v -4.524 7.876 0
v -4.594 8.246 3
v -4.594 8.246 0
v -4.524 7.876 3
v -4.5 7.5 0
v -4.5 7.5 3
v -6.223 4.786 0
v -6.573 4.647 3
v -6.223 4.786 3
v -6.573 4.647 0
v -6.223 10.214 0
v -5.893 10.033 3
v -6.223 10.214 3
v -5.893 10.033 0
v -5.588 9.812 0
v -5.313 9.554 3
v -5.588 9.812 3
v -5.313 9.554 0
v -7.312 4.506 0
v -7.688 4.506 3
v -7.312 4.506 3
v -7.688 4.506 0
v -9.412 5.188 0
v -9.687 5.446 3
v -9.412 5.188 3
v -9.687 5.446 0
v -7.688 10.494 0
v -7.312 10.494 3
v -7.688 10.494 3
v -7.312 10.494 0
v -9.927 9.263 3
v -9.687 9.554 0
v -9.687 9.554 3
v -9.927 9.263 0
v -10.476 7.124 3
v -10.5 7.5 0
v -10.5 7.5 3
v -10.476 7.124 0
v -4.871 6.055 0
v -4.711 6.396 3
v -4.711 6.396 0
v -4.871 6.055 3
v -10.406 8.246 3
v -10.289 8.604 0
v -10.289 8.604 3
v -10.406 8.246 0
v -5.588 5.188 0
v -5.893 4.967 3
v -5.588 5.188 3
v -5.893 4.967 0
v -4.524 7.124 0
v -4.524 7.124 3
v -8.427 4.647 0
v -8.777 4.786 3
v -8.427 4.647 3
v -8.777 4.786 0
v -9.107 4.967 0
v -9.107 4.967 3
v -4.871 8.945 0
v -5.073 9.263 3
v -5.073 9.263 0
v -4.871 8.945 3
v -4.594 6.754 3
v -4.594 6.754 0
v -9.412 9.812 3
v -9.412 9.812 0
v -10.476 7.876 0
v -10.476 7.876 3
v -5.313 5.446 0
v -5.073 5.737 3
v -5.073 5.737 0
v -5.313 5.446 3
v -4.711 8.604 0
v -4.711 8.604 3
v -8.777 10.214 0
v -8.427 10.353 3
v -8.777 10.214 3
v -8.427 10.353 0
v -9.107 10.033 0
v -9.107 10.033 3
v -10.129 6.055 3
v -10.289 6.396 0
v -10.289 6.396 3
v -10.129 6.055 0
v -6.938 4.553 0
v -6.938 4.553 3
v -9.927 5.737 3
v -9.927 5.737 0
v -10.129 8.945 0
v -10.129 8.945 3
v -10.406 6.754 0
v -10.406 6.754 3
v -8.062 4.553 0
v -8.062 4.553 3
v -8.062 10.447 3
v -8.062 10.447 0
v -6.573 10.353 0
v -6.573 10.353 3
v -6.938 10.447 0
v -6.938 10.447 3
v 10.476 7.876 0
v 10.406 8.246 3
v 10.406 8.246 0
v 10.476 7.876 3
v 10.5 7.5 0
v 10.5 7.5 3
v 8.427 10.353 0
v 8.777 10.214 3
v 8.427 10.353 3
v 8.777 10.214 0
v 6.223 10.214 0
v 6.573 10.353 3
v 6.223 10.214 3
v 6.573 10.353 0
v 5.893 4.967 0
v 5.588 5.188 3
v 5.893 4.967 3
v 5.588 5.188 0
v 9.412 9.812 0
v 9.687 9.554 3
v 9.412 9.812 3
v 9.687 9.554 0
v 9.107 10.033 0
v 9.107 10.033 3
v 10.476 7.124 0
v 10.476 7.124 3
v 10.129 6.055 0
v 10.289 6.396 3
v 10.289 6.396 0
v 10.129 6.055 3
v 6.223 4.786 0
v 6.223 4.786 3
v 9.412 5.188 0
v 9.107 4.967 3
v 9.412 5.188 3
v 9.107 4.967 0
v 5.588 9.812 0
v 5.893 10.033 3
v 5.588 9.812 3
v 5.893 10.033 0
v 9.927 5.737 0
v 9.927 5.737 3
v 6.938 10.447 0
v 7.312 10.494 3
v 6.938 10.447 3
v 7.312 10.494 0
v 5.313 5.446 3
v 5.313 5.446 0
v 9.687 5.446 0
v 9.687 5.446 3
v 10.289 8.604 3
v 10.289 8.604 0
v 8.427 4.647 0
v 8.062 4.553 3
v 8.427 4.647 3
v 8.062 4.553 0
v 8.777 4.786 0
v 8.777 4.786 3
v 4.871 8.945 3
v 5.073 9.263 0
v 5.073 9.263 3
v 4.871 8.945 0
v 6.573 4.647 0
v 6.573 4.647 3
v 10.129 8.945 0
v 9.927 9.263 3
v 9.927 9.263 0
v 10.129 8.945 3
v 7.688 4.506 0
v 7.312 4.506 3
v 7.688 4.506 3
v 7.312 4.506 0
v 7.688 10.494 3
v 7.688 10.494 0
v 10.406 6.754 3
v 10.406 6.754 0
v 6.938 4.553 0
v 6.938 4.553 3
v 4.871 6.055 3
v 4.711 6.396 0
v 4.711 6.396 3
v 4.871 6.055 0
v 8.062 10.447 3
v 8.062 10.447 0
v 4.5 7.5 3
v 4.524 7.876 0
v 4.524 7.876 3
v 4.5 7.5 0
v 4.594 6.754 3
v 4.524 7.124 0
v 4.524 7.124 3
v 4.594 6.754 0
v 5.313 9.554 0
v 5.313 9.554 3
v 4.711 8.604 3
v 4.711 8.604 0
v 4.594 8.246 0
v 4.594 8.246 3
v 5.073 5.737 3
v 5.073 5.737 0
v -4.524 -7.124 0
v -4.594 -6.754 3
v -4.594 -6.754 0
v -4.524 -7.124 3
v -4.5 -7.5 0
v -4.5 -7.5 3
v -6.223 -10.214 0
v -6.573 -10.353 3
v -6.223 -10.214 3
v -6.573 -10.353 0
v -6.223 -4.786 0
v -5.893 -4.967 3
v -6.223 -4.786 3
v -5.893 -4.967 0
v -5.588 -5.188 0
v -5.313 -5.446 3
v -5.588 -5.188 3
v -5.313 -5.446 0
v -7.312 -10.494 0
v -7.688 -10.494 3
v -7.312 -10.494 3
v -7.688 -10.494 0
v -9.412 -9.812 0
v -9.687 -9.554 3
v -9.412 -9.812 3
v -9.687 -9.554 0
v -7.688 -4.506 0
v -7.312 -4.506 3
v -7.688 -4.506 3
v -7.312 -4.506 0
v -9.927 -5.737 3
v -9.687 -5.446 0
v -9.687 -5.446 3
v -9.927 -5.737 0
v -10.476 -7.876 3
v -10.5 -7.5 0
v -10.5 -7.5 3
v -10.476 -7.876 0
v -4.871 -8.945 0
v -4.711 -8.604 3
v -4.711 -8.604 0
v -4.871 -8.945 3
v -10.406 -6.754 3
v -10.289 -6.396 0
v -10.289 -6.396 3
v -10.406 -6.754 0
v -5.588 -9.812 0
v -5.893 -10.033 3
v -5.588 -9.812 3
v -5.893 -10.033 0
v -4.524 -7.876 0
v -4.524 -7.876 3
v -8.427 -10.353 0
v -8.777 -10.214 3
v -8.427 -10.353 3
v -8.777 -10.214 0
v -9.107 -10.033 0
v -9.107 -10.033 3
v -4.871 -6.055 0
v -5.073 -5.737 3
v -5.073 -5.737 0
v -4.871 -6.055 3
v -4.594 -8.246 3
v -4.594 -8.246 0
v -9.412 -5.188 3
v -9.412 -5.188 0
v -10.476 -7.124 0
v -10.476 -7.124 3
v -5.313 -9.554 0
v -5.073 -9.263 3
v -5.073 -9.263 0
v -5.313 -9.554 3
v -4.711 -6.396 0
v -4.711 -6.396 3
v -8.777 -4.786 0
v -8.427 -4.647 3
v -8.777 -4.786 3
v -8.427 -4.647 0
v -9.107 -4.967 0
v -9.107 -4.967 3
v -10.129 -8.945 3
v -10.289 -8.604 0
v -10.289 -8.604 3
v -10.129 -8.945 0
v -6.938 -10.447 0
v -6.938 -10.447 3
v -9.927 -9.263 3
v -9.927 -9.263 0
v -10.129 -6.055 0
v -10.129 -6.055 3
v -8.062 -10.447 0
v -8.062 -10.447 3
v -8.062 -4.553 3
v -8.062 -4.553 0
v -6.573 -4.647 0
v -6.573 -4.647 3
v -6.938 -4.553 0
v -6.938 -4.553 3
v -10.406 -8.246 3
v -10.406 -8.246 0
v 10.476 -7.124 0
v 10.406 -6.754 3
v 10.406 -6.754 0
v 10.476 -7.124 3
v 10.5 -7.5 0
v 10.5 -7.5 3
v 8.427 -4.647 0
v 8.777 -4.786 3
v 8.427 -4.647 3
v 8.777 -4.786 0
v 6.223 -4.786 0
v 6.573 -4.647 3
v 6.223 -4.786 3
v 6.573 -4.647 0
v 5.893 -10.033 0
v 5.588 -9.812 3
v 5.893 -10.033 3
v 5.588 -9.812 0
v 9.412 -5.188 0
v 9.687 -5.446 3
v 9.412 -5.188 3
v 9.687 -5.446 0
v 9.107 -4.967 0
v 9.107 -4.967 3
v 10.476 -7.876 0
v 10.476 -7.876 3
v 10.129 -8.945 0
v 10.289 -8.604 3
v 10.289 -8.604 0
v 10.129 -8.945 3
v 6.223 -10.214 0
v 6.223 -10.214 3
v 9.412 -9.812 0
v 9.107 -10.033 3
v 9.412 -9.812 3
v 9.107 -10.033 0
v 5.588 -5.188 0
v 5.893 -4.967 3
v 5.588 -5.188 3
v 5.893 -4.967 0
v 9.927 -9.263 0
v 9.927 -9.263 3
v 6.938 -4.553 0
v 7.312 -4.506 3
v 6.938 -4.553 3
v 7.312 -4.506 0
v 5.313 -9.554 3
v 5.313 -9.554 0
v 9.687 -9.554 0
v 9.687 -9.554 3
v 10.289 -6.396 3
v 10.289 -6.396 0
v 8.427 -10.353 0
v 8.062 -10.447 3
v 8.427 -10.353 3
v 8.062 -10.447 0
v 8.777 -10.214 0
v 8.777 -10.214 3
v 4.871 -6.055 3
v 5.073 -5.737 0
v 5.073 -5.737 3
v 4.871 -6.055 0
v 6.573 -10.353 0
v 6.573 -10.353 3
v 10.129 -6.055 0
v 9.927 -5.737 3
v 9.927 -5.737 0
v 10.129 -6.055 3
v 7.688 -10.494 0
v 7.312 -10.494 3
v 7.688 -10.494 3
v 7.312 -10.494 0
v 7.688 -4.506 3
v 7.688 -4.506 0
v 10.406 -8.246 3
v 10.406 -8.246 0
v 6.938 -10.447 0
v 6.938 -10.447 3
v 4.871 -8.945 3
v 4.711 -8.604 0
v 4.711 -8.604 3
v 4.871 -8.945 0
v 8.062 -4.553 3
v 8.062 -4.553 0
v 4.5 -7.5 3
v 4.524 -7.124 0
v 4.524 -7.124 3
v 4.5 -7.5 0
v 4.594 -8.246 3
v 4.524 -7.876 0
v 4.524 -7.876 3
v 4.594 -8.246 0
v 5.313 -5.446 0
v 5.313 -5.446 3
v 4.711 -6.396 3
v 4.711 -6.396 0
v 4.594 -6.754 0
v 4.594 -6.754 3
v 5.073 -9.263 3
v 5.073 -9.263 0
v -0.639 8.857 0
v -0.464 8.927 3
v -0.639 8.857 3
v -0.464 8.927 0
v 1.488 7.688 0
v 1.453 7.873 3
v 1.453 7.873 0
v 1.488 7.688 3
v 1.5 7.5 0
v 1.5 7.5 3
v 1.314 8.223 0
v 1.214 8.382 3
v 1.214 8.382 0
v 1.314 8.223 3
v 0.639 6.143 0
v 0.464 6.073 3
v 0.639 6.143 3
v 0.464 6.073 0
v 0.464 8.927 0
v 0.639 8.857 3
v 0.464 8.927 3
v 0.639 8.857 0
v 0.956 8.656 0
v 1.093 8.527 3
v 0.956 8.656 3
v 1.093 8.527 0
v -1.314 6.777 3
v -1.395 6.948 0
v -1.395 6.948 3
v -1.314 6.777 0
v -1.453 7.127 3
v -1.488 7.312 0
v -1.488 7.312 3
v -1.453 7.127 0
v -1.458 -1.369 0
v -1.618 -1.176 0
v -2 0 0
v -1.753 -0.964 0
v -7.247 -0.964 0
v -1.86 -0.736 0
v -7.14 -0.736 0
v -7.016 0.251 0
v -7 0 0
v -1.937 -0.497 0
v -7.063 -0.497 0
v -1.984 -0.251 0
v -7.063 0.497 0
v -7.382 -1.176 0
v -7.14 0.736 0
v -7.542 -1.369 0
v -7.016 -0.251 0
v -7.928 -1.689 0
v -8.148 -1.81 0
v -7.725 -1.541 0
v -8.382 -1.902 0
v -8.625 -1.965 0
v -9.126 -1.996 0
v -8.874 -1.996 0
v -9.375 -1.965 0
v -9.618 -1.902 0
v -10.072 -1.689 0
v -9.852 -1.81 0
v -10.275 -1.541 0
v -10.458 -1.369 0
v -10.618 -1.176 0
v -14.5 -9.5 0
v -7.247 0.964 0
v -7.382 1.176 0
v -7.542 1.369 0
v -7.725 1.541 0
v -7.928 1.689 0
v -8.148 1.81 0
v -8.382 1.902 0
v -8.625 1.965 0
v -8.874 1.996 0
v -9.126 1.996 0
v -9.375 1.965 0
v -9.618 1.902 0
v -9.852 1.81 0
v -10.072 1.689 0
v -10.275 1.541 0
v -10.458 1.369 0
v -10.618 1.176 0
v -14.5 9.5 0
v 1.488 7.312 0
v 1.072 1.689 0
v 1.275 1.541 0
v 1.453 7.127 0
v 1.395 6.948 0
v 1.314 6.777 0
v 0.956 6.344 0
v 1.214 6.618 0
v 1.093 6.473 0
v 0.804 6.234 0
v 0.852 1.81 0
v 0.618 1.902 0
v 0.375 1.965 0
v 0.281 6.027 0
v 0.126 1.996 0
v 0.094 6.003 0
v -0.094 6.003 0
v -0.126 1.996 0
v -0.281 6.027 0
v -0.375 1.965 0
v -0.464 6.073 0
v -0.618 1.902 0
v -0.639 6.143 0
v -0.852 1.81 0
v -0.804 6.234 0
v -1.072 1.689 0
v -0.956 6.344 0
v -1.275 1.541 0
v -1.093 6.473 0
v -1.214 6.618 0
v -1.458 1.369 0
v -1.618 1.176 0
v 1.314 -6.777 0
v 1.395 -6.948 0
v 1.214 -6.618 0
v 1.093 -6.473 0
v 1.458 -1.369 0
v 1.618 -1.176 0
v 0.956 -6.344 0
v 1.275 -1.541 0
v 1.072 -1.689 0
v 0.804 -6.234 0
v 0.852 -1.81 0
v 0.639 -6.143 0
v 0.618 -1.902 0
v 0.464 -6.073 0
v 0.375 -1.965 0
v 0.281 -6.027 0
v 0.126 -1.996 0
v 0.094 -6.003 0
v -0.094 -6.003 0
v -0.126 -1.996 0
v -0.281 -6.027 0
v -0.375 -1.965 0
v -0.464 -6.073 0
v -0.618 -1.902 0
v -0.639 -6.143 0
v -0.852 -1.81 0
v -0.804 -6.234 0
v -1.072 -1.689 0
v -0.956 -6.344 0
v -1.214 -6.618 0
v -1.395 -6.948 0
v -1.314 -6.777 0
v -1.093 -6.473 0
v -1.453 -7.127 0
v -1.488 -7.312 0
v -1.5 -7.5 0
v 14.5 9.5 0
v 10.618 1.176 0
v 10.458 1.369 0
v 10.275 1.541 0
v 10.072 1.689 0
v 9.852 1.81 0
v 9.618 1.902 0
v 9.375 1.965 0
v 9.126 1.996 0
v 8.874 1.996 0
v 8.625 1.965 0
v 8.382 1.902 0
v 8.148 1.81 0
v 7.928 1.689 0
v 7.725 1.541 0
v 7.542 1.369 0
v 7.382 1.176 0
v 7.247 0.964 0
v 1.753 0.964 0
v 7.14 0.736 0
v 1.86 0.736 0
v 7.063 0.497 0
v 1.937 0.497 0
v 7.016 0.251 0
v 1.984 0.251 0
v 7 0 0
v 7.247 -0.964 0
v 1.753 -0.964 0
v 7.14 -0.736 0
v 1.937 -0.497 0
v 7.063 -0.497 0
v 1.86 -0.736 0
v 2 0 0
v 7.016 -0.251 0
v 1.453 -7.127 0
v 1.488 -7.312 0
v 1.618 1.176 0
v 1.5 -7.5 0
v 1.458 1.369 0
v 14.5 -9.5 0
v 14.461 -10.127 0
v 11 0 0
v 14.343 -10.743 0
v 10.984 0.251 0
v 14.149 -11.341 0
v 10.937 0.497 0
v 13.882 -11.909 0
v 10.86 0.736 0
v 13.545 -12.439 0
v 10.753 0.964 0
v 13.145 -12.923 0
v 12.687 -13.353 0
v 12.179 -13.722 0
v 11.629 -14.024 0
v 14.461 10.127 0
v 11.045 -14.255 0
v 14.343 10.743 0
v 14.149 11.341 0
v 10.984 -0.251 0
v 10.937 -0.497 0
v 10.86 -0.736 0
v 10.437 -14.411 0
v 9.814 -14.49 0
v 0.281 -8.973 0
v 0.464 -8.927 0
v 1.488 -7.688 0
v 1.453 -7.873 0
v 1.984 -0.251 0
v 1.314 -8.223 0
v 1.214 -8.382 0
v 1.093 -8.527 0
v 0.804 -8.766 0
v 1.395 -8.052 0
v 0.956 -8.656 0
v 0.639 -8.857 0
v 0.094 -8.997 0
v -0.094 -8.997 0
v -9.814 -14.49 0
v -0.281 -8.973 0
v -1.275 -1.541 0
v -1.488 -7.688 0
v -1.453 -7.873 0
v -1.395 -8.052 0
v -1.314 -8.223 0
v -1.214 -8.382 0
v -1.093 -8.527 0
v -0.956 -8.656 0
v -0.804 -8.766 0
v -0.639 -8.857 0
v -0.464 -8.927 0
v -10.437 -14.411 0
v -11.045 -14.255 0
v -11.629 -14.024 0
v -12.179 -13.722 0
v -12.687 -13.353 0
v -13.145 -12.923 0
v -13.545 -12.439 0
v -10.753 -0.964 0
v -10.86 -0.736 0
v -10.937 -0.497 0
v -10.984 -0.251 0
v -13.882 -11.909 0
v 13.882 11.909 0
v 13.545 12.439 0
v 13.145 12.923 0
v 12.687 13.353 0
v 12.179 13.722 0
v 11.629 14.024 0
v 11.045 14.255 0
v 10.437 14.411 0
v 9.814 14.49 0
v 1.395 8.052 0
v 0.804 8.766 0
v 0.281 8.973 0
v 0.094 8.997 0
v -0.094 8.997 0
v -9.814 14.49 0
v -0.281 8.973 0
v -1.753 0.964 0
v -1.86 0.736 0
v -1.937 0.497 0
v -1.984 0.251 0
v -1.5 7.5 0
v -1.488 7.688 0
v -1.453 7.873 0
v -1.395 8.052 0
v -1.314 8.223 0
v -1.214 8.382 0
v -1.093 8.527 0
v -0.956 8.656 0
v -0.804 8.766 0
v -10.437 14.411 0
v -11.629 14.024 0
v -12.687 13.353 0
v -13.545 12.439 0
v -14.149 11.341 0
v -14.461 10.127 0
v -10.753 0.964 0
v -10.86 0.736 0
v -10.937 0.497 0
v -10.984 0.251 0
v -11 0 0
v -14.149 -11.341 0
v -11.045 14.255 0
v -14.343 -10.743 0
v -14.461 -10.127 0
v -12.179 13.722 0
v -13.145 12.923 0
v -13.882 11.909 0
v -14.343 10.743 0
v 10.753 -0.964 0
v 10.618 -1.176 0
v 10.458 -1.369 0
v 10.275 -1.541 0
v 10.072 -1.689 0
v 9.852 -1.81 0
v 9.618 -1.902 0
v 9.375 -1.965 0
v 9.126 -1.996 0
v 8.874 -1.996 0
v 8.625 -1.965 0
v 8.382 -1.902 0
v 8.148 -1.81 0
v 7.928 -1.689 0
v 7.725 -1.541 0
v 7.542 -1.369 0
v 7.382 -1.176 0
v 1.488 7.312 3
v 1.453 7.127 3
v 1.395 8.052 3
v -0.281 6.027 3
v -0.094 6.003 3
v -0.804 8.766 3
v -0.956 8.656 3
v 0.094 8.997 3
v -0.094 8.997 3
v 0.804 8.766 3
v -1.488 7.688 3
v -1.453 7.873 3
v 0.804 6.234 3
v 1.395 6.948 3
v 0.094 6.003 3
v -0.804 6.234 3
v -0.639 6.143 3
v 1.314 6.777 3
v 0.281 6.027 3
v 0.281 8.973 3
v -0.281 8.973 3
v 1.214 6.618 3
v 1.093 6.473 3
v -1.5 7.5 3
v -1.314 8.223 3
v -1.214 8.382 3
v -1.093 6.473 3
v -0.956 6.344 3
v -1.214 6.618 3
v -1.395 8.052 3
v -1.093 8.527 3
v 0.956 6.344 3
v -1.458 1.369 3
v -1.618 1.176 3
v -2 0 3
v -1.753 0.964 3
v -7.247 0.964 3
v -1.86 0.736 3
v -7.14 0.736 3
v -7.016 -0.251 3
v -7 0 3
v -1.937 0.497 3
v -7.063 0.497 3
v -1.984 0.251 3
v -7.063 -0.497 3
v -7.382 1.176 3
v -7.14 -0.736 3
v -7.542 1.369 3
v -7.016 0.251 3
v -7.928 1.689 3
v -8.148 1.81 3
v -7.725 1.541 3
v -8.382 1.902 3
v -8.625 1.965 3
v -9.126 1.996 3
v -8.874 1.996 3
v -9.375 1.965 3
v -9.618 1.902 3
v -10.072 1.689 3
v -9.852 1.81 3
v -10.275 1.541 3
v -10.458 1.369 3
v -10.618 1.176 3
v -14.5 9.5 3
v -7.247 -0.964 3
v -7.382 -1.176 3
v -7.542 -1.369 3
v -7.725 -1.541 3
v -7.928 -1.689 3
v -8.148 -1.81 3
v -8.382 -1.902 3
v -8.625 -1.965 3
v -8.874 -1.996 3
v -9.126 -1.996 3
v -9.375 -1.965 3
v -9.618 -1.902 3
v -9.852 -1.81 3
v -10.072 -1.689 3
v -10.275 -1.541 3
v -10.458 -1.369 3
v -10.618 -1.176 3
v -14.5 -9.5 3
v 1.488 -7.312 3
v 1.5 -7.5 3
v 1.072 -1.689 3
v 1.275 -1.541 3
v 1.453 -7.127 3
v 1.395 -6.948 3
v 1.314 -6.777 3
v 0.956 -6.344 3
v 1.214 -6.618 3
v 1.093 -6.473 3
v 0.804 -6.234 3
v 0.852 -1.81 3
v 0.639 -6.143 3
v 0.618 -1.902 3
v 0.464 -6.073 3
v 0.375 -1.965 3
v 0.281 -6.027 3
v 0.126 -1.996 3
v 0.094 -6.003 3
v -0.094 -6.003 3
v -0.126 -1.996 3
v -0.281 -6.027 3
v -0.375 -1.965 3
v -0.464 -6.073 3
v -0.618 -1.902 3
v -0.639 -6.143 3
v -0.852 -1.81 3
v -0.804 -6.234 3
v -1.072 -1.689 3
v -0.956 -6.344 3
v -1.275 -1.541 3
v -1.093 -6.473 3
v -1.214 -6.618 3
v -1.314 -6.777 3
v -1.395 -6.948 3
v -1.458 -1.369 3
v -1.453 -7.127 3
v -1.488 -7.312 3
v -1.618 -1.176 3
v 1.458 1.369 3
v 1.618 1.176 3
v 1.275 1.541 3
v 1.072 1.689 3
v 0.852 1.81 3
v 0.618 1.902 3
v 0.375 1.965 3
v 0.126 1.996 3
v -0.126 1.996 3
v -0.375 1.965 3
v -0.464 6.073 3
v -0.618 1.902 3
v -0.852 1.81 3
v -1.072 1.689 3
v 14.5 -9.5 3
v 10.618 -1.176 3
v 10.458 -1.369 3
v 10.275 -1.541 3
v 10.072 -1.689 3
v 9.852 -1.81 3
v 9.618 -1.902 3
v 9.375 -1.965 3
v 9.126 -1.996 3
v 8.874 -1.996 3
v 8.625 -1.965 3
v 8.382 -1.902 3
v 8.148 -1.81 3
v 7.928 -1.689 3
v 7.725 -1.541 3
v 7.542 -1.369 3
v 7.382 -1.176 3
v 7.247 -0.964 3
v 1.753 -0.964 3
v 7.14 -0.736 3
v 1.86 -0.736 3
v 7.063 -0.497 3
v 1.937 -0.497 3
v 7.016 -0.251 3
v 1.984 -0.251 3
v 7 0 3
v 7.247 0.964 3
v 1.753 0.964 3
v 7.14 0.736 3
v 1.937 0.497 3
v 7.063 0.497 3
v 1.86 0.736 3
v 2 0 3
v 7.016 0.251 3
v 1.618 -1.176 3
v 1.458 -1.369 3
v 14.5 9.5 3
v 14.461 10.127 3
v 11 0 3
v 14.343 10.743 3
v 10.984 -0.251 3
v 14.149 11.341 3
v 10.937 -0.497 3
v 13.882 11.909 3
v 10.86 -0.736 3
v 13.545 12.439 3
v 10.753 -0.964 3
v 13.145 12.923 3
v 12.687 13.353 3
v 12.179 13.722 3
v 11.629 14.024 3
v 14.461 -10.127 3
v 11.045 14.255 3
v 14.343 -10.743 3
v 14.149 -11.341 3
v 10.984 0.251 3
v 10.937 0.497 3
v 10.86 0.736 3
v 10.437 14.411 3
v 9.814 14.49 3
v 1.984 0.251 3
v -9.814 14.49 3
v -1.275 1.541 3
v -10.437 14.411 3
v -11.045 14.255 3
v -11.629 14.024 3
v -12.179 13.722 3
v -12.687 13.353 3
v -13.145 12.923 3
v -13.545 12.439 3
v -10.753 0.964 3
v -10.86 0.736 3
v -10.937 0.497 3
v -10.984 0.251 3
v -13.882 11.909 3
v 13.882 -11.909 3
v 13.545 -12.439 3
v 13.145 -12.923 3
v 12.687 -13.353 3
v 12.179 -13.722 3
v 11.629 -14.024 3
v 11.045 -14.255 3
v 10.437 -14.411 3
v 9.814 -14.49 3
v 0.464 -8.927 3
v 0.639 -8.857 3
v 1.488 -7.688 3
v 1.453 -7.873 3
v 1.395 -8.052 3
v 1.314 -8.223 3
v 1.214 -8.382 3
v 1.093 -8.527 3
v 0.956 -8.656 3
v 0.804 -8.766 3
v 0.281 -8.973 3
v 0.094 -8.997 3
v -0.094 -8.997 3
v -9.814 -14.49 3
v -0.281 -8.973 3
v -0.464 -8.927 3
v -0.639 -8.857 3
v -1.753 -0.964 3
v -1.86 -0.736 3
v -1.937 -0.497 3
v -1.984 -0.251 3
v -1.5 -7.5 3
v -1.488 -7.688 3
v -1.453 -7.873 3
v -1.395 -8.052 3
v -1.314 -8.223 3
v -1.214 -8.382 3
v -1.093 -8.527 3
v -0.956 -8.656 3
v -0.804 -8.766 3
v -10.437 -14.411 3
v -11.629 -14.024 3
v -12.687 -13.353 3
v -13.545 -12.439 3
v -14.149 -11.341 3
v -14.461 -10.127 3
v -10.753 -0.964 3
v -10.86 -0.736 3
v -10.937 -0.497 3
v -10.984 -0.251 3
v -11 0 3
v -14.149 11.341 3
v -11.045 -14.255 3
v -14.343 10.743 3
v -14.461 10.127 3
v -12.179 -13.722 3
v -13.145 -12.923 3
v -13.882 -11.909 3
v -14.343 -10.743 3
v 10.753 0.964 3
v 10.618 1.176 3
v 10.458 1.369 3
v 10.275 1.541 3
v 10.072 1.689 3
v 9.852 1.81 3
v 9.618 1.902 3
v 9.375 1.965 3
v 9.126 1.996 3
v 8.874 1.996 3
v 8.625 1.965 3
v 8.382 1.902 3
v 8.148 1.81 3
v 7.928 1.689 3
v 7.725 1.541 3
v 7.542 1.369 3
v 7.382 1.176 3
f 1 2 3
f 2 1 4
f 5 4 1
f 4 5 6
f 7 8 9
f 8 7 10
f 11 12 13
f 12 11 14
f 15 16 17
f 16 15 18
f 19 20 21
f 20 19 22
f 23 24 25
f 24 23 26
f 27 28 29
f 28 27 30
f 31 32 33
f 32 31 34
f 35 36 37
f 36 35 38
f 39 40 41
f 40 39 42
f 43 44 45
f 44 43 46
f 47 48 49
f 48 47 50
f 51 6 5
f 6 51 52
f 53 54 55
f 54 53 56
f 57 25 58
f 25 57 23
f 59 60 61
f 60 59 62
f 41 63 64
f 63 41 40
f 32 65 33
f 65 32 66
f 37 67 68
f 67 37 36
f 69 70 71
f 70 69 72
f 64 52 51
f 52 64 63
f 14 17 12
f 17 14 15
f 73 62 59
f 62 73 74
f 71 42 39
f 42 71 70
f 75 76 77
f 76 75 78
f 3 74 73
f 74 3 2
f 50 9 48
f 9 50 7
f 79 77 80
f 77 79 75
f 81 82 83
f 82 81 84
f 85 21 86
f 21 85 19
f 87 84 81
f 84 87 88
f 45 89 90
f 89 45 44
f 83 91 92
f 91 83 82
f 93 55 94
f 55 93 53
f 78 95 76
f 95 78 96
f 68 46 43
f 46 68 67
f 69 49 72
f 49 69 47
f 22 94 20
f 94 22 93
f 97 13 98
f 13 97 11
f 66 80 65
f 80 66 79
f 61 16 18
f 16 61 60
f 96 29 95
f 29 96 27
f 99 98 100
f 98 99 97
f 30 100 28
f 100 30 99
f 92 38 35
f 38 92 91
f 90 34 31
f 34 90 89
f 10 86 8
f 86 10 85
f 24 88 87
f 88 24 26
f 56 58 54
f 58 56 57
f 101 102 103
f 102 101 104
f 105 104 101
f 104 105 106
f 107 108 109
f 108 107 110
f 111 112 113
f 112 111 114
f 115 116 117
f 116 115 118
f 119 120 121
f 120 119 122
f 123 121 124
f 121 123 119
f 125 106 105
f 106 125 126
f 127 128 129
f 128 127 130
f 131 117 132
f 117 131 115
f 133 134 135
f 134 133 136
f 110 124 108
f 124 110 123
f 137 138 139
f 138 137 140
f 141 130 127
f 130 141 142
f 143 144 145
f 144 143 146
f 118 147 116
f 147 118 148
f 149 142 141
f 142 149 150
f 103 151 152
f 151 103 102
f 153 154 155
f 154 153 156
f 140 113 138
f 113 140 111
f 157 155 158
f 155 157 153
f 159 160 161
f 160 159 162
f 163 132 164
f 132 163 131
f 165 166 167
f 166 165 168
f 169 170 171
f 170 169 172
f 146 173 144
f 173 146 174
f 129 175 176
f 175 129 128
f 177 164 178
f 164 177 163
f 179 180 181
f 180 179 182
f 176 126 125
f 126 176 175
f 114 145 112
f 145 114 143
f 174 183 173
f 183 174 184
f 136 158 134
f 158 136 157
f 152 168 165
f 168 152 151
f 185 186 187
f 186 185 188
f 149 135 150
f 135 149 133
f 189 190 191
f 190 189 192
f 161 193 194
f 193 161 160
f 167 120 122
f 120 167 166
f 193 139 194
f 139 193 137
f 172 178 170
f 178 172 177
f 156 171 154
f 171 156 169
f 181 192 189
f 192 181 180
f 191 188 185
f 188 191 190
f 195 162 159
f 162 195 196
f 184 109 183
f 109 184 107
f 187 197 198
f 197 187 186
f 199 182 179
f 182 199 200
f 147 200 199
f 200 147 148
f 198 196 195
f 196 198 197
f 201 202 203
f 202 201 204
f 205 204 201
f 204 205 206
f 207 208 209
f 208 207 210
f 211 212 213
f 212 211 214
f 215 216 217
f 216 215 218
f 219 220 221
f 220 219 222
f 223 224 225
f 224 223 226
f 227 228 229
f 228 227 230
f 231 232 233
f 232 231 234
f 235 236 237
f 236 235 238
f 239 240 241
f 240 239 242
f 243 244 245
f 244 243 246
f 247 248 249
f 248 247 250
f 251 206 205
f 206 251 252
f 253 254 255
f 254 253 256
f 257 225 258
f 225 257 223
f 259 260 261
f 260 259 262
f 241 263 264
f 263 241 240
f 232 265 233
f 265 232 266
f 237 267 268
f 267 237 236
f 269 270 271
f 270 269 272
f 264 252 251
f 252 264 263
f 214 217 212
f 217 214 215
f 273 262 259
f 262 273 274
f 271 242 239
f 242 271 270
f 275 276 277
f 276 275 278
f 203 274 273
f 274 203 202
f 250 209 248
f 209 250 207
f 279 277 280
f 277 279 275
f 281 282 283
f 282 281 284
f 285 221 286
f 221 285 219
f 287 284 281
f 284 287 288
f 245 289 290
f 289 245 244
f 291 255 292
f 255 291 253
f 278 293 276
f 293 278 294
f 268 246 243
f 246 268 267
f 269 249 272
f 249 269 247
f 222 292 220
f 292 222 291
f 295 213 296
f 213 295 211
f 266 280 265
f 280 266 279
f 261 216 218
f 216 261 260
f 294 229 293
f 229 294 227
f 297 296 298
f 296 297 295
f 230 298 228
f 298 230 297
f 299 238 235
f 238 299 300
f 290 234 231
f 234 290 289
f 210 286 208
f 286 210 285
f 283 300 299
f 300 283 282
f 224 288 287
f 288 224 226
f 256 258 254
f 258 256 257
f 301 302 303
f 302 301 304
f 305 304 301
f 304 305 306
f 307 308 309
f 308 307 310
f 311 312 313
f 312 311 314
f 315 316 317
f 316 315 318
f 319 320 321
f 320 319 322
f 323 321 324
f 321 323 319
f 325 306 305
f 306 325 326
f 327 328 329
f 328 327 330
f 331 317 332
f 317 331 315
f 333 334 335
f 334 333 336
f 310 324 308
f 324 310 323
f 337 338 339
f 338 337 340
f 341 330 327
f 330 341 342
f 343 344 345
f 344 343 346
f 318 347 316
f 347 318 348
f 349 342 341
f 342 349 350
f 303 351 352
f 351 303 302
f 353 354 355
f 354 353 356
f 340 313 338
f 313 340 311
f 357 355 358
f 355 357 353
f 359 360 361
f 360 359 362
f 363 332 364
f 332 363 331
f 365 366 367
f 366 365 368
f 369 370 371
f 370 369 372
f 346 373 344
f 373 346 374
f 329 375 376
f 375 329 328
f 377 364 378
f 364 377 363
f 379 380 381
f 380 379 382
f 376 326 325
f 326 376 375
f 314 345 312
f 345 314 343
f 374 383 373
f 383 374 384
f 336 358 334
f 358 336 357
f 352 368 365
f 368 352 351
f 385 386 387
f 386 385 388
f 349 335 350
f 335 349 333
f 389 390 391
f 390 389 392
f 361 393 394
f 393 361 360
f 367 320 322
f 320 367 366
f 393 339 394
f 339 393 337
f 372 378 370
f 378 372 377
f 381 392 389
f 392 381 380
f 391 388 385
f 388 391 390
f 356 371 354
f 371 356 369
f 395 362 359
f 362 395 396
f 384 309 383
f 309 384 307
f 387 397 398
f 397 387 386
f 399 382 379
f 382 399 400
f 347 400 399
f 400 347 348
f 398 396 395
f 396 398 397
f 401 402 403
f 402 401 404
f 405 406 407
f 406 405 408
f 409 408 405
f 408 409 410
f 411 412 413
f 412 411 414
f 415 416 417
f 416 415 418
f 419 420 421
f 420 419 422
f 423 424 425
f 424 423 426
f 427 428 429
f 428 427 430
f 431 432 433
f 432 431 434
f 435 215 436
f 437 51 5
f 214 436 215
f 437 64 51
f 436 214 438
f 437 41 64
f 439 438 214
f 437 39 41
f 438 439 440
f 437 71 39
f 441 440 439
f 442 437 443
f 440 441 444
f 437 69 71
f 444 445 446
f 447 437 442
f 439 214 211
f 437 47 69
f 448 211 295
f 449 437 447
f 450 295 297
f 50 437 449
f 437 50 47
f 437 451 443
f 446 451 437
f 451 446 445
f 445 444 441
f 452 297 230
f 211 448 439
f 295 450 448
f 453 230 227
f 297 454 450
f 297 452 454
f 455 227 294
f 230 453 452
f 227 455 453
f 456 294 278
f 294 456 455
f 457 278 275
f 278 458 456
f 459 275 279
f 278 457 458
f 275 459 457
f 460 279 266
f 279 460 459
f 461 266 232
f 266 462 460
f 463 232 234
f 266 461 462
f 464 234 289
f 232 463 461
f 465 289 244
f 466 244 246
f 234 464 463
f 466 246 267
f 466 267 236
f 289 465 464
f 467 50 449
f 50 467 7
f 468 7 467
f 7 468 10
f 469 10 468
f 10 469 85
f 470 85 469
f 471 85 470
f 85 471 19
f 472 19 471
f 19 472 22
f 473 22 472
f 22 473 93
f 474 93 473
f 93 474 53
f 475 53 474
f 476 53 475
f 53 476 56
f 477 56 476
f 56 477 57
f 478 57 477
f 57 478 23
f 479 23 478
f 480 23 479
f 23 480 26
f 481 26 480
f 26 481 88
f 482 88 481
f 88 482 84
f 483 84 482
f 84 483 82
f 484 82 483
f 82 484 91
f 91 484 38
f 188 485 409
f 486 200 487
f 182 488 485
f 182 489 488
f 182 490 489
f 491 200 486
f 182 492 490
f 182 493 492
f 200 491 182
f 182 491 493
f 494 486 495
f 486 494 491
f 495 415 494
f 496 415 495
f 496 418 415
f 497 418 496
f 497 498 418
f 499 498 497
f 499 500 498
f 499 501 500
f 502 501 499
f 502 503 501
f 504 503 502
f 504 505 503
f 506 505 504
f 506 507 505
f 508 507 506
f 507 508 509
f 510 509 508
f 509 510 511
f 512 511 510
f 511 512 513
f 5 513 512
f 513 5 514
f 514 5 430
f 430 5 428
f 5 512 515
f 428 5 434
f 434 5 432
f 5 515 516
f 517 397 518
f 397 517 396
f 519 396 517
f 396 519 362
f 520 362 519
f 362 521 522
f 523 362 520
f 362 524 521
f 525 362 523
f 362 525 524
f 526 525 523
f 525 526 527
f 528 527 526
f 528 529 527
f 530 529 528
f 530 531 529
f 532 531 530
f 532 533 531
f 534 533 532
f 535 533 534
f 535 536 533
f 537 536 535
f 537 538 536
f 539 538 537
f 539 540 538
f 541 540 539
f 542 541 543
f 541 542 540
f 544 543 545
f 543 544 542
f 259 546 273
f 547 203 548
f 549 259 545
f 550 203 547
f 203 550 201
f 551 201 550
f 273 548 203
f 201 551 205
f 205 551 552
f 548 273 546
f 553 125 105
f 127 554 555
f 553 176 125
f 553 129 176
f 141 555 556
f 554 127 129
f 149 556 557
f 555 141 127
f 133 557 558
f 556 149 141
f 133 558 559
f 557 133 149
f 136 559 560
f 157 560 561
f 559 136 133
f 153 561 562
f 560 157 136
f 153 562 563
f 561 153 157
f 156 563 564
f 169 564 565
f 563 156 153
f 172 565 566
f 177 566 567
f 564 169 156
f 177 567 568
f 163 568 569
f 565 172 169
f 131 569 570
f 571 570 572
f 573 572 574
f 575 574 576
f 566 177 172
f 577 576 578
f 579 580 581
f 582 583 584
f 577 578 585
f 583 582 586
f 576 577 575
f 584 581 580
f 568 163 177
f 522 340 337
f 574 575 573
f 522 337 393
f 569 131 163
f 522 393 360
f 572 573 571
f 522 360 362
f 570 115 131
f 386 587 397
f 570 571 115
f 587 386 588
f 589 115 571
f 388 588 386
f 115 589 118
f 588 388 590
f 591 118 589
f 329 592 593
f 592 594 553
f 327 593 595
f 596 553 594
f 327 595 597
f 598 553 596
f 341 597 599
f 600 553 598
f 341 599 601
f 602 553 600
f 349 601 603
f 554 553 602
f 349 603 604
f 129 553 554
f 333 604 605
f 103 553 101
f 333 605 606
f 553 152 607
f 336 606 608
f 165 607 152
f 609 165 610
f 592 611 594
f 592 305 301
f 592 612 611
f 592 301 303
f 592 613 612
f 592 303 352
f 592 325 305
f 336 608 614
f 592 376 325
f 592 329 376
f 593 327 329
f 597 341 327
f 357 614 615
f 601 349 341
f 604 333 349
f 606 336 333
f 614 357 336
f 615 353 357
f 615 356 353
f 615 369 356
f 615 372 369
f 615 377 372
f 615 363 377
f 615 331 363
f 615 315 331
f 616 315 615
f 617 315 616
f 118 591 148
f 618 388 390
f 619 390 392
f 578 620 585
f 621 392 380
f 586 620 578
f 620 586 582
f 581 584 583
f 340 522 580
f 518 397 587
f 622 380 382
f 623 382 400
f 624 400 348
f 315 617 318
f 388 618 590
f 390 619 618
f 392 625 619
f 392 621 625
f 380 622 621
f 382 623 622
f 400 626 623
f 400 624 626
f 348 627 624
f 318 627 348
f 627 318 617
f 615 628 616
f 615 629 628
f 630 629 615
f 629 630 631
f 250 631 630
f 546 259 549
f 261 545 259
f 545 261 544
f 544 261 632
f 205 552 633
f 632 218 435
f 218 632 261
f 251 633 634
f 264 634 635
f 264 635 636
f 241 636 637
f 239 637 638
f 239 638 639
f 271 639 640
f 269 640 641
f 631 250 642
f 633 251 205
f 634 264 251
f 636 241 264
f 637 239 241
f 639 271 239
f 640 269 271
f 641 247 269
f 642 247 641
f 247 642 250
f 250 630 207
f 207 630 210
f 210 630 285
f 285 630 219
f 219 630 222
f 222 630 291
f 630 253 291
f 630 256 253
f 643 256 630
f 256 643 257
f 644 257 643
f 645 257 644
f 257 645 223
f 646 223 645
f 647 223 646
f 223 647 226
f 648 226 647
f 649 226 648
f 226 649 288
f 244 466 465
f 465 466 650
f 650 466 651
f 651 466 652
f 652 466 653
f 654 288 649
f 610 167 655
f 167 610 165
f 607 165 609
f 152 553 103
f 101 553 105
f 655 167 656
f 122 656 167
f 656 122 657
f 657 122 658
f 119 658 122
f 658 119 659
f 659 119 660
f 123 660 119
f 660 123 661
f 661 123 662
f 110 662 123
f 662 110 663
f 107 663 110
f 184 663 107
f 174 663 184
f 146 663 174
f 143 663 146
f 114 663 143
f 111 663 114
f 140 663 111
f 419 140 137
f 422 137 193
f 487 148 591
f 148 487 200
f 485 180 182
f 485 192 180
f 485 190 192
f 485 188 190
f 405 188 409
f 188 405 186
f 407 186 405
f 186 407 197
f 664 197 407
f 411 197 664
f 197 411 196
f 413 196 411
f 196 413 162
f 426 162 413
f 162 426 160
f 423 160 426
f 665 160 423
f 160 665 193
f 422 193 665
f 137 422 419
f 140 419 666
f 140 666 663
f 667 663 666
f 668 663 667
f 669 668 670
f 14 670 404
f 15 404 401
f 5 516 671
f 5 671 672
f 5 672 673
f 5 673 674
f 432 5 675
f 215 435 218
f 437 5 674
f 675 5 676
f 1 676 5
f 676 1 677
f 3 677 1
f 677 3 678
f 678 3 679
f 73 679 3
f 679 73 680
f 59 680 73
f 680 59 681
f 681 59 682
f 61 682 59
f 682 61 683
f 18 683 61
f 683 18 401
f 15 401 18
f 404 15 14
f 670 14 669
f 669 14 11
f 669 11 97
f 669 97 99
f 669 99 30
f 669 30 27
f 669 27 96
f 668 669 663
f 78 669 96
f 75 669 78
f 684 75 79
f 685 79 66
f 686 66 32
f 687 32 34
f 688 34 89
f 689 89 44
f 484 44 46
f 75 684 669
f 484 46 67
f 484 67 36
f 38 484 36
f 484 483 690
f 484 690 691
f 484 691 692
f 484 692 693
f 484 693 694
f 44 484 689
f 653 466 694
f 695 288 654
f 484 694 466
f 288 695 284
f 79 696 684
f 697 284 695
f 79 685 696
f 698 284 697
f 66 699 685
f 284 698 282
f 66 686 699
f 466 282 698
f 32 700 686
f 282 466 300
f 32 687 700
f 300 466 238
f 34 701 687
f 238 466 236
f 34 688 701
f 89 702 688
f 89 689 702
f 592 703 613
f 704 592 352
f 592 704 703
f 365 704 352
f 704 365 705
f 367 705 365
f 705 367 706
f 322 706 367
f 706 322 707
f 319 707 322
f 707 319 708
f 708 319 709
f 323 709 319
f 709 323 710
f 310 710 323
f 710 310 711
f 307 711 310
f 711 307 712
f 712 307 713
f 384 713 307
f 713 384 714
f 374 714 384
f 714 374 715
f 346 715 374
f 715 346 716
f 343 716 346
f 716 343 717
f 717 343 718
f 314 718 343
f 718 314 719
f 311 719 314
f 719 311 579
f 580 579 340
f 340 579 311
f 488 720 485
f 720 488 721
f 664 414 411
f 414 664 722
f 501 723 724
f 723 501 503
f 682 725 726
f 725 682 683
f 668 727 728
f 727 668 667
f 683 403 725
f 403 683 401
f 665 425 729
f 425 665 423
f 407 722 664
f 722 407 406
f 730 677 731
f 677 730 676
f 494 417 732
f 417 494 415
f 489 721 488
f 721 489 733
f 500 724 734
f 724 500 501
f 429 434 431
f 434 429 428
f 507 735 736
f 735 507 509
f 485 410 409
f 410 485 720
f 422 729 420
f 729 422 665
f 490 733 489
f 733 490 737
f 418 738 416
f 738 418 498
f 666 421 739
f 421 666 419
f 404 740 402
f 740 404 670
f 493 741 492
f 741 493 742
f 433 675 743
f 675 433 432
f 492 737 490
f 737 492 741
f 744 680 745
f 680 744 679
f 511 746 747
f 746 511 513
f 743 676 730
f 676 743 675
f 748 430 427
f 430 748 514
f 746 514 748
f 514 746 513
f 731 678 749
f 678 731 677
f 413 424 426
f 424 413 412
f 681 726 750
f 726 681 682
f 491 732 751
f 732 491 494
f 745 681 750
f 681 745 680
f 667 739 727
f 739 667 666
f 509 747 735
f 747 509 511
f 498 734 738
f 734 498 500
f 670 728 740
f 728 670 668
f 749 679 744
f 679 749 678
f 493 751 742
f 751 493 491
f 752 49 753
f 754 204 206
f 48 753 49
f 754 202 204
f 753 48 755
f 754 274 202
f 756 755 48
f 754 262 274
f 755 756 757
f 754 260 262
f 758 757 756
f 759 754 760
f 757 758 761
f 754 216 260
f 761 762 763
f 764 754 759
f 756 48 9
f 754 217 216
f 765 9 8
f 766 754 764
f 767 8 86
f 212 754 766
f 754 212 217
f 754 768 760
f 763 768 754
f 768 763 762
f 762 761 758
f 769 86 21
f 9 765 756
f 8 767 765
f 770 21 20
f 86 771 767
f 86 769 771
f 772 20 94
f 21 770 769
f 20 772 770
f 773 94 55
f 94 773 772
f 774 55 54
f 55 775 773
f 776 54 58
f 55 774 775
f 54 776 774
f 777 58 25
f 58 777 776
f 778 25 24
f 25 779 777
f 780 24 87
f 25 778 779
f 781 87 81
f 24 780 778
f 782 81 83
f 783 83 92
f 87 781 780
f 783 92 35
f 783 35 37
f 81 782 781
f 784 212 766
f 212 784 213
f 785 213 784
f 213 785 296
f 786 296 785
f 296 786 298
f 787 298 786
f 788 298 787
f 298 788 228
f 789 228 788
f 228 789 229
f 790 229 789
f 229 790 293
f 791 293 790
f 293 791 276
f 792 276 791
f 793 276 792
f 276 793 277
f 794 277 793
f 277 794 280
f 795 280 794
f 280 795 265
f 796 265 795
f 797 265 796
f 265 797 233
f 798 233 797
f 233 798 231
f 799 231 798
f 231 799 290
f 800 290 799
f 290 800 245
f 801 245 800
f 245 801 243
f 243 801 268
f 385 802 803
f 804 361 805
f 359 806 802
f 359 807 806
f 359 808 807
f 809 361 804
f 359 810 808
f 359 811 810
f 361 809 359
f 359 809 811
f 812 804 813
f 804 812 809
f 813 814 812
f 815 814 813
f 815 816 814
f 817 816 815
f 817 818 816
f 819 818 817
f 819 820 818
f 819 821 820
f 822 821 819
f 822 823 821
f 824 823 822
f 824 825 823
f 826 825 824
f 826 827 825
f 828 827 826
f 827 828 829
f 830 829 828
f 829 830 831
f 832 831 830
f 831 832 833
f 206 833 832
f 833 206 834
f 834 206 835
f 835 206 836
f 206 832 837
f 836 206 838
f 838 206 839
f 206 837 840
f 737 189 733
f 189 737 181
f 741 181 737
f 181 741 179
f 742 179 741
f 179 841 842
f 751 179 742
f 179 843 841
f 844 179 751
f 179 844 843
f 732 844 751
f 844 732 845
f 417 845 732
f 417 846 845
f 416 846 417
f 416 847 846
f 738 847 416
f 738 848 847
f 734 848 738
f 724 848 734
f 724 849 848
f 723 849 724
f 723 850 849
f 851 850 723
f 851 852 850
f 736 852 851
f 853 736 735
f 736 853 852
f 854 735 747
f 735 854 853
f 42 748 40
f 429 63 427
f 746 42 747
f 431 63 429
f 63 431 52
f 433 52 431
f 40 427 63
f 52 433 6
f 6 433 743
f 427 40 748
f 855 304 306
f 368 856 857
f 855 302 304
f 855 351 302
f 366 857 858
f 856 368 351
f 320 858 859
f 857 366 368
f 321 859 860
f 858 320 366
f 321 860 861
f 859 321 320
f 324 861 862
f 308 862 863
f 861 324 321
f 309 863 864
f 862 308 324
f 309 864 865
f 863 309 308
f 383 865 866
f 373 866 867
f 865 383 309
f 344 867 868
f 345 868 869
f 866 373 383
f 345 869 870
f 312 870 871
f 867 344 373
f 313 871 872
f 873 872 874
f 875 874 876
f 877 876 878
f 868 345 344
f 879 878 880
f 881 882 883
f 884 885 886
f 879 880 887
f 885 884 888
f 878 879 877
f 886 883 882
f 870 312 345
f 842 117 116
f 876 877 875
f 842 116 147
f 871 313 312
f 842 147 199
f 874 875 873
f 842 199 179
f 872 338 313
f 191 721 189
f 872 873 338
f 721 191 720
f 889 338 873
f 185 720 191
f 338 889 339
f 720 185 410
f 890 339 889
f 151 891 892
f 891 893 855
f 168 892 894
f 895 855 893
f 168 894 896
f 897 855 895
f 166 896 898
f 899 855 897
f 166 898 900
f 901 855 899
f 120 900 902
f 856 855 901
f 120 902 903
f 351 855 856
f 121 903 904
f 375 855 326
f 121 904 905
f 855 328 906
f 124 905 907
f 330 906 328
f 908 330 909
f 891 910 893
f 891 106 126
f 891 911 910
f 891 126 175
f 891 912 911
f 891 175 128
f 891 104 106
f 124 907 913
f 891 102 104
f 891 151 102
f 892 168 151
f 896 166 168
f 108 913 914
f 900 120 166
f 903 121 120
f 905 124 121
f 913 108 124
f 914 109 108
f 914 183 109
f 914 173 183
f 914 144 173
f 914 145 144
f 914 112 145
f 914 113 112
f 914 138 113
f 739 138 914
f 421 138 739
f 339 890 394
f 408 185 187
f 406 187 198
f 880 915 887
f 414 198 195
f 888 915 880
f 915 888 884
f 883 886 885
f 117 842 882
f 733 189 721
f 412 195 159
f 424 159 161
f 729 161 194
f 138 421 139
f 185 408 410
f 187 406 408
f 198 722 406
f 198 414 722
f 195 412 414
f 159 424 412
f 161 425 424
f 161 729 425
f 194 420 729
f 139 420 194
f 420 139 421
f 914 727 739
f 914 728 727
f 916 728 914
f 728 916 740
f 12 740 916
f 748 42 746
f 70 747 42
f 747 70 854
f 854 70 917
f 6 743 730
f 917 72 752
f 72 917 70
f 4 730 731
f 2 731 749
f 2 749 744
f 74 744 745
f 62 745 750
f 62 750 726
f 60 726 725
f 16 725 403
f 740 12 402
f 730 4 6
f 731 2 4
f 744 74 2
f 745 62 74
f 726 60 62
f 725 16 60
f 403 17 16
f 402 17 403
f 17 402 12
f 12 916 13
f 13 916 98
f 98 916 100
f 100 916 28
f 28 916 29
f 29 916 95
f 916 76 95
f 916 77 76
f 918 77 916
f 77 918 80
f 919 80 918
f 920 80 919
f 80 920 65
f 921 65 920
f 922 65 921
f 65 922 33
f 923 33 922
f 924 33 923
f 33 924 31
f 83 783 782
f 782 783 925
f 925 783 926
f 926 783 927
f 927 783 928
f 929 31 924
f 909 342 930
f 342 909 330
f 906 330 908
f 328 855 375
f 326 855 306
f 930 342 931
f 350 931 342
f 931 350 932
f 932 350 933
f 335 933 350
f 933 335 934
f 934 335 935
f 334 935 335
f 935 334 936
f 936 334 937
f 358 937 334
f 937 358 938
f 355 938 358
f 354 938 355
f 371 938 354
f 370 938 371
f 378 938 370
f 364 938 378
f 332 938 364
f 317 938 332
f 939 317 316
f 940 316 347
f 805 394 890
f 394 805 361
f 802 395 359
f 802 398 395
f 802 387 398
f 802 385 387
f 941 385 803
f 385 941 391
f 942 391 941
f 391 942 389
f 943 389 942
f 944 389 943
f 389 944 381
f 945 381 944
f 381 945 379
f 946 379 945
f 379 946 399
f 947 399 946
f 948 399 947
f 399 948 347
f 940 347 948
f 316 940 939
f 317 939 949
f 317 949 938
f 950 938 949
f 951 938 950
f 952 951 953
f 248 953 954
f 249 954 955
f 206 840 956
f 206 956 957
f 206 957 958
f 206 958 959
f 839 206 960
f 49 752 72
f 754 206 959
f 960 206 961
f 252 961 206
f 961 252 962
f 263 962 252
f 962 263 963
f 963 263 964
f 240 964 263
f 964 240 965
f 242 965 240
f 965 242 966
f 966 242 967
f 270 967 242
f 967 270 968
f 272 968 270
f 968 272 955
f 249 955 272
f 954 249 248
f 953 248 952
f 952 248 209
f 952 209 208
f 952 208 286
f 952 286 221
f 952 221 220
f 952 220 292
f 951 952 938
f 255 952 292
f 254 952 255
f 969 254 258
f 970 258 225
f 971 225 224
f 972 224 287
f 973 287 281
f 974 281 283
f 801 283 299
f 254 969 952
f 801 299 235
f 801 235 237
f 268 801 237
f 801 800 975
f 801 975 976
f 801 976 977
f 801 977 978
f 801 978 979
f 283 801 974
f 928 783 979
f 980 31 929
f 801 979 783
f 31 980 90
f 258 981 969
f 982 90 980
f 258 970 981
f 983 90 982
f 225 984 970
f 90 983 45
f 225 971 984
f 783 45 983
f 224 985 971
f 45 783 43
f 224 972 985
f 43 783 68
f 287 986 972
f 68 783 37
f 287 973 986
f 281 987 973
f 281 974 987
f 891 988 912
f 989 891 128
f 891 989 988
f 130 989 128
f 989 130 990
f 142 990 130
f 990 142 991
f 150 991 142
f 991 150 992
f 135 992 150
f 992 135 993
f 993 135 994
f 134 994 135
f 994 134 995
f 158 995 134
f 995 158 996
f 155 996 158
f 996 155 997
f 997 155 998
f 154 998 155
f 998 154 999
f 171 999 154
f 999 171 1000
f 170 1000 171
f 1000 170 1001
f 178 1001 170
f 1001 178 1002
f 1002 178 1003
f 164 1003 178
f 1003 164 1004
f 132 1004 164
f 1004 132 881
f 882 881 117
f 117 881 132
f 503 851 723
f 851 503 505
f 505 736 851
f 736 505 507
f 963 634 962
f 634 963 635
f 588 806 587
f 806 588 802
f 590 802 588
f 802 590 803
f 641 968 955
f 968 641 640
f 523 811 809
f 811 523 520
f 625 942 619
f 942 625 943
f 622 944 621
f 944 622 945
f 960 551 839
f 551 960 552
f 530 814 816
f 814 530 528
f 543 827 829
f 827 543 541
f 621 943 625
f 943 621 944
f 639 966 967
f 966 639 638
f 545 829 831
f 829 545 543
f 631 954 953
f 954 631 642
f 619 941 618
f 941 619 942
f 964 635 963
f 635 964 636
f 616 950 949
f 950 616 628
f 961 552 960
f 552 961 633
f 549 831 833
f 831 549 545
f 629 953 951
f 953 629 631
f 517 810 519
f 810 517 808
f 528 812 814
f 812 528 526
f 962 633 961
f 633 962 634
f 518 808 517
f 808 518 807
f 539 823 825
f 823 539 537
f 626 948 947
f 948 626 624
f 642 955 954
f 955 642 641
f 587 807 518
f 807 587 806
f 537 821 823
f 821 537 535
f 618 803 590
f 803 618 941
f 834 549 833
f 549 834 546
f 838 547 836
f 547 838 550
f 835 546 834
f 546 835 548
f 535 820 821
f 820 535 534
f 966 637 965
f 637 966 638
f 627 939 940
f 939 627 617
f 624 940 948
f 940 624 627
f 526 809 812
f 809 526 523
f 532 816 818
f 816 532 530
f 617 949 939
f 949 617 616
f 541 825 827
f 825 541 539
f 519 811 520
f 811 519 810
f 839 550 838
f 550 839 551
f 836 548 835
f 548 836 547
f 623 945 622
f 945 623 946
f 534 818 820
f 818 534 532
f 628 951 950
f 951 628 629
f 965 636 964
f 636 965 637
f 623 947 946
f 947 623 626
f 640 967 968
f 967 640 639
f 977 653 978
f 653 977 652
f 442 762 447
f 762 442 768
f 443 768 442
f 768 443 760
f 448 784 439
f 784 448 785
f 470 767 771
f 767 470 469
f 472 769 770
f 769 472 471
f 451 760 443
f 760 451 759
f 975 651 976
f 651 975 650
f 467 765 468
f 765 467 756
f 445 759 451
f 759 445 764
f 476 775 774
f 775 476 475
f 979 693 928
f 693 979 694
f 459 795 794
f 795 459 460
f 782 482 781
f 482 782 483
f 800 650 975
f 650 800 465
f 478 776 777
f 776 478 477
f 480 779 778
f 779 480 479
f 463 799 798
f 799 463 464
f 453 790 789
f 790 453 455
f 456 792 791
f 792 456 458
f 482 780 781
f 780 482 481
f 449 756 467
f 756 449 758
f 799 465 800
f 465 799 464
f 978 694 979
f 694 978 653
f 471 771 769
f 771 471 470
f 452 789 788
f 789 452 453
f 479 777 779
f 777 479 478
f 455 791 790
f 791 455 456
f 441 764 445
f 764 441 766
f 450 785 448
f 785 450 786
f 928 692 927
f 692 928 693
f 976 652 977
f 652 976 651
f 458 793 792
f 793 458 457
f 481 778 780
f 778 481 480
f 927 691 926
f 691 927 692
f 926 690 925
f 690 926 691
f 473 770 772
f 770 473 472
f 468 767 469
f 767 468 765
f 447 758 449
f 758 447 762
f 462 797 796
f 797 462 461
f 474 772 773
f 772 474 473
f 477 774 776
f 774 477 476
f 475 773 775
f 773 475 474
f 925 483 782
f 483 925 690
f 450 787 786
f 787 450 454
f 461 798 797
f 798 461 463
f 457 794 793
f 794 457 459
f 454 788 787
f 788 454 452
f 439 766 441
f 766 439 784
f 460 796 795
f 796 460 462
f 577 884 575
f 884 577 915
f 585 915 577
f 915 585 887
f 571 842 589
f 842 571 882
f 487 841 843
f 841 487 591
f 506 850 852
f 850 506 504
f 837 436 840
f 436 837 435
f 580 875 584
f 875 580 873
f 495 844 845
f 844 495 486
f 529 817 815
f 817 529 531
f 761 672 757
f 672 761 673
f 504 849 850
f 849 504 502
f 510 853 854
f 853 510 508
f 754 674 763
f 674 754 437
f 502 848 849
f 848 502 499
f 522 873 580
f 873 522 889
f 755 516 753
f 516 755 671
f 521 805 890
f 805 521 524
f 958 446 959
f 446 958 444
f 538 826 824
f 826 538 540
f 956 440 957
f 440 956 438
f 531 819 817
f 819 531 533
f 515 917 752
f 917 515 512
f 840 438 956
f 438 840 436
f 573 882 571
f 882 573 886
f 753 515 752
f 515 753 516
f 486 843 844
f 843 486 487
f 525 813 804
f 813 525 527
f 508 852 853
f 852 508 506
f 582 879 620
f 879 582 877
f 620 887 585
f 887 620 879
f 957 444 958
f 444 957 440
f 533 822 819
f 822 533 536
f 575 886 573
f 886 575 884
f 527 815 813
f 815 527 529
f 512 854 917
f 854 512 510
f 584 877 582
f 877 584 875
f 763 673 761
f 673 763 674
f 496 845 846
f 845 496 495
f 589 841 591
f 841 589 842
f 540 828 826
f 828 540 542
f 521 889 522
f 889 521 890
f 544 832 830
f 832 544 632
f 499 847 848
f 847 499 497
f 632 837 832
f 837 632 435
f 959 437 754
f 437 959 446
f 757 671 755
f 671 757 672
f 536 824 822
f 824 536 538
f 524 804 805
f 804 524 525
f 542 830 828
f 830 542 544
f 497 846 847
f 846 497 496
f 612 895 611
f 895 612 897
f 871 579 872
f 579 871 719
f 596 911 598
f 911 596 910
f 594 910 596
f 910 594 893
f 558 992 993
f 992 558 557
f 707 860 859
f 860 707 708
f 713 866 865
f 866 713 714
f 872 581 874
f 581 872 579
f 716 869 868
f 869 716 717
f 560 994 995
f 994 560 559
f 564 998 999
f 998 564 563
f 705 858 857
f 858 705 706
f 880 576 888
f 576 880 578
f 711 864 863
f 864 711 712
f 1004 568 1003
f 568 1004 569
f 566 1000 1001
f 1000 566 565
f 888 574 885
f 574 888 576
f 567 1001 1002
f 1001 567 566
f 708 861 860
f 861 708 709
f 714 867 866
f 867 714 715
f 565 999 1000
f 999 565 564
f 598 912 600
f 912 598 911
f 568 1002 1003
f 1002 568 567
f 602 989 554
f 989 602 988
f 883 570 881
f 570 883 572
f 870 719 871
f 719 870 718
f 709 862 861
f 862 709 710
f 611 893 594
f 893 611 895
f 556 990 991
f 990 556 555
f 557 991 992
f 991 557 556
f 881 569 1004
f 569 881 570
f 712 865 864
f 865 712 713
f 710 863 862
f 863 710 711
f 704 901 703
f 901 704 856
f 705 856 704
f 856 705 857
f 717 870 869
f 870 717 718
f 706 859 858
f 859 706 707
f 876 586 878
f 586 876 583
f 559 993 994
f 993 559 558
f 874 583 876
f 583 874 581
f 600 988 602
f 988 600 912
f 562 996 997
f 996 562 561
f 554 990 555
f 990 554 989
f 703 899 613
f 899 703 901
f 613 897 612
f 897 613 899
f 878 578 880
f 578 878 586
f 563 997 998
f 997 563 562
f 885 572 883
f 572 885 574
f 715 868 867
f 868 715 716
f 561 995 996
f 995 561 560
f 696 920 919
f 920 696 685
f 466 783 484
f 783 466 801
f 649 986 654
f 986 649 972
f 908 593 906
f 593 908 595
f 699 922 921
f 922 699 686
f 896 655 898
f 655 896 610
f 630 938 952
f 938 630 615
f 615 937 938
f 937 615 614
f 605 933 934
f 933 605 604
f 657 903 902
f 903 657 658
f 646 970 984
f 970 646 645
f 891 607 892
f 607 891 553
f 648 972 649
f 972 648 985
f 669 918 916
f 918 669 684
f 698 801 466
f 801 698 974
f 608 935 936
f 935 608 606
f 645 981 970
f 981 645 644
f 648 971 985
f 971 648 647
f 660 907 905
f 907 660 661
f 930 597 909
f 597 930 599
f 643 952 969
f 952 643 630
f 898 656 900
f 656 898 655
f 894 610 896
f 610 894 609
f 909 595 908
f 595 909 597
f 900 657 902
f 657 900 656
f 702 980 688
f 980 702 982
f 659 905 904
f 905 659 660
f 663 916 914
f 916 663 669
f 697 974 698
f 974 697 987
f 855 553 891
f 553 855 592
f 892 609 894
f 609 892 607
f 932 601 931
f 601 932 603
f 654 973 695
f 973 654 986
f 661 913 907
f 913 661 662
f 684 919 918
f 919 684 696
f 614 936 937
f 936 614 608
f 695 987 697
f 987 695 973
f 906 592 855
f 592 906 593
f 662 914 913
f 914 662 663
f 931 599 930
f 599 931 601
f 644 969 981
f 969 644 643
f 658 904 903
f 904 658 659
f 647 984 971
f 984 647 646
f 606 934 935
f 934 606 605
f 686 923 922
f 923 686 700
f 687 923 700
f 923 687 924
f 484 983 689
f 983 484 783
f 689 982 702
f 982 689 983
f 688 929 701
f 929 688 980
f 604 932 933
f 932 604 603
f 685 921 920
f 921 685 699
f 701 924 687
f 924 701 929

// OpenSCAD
$fn = 50;


difference() {
	union() {
		hull() {
			translate(v = [-9.5000000000, 9.5000000000, 0]) {
				cylinder(h = 3, r = 5);
			}
			translate(v = [9.5000000000, 9.5000000000, 0]) {
				cylinder(h = 3, r = 5);
			}
			translate(v = [-9.5000000000, -9.5000000000, 0]) {
				cylinder(h = 3, r = 5);
			}
			translate(v = [9.5000000000, -9.5000000000, 0]) {
				cylinder(h = 3, r = 5);
			}
		}
	}
	union() {
		#translate(v = [-7.5000000000, 7.5000000000, 0]) {
			cylinder(h = 3, r = 3.0000000000);
		}
		#translate(v = [7.5000000000, 7.5000000000, 0]) {
			cylinder(h = 3, r = 3.0000000000);
		}
		#translate(v = [-7.5000000000, -7.5000000000, 0]) {
			cylinder(h = 3, r = 3.0000000000);
		}
		#translate(v = [7.5000000000, -7.5000000000, 0]) {
			cylinder(h = 3, r = 3.0000000000);
		}
		#translate(v = [-7.5000000000, -7.5000000000, -100.0000000000]) {
			cylinder(h = 200, r = 3.0000000000);
		}
		#translate(v = [-7.5000000000, 7.5000000000, -100.0000000000]) {
			cylinder(h = 200, r = 3.0000000000);
		}
		#translate(v = [7.5000000000, -7.5000000000, -100.0000000000]) {
			cylinder(h = 200, r = 3.0000000000);
		}
		#translate(v = [7.5000000000, 7.5000000000, -100.0000000000]) {
			cylinder(h = 200, r = 3.0000000000);
		}
		#translate(v = [-7.5000000000, 7.5000000000, 0]) {
			cylinder(h = 3, r = 1.5000000000);
		}
		#translate(v = [0.0000000000, 7.5000000000, 0]) {
			cylinder(h = 3, r = 1.5000000000);
		}
		#translate(v = [7.5000000000, 7.5000000000, 0]) {
			cylinder(h = 3, r = 1.5000000000);
		}
		#translate(v = [-7.5000000000, -7.5000000000, 0]) {
			cylinder(h = 3, r = 1.5000000000);
		}
		#translate(v = [0.0000000000, -7.5000000000, 0]) {
			cylinder(h = 3, r = 1.5000000000);
		}
		#translate(v = [7.5000000000, -7.5000000000, 0]) {
			cylinder(h = 3, r = 1.5000000000);
		}
		#translate(v = [-7.5000000000, 7.5000000000, 0]) {
			cylinder(h = 3, r = 1.5000000000);
		}
		#translate(v = [0.0000000000, 7.5000000000, 0]) {
			cylinder(h = 3, r = 1.5000000000);
		}
		#translate(v = [7.5000000000, 7.5000000000, 0]) {
			cylinder(h = 3, r = 1.5000000000);
		}
		#translate(v = [-7.5000000000, -7.5000000000, 0]) {
			cylinder(h = 3, r = 1.5000000000);
		}
		#translate(v = [0.0000000000, -7.5000000000, 0]) {
			cylinder(h = 3, r = 1.5000000000);
		}
		#translate(v = [7.5000000000, -7.5000000000, 0]) {
			cylinder(h = 3, r = 1.5000000000);
		}
		#translate(v = [-7.5000000000, 7.5000000000, 0]) {
			cylinder(h = 3, r = 1.5000000000);
		}
		#translate(v = [0.0000000000, 7.5000000000, 0]) {
			cylinder(h = 3, r = 1.5000000000);
		}
		#translate(v = [7.5000000000, 7.5000000000, 0]) {
			cylinder(h = 3, r = 1.5000000000);
		}
		#translate(v = [-7.5000000000, -7.5000000000, 0]) {
			cylinder(h = 3, r = 1.5000000000);
		}
		#translate(v = [0.0000000000, -7.5000000000, 0]) {
			cylinder(h = 3, r = 1.5000000000);
		}
		#translate(v = [7.5000000000, -7.5000000000, 0]) {
			cylinder(h = 3, r = 1.5000000000);
		}
		#translate(v = [-9.0000000000, 0, 0]) {
			cylinder(h = 3, r = 2.0000000000);
		}
		#cylinder(h = 3, r = 2.0000000000);
		#translate(v = [9.0000000000, 0, 0]) {
			cylinder(h = 3, r = 2.0000000000);
		}
	}
}
